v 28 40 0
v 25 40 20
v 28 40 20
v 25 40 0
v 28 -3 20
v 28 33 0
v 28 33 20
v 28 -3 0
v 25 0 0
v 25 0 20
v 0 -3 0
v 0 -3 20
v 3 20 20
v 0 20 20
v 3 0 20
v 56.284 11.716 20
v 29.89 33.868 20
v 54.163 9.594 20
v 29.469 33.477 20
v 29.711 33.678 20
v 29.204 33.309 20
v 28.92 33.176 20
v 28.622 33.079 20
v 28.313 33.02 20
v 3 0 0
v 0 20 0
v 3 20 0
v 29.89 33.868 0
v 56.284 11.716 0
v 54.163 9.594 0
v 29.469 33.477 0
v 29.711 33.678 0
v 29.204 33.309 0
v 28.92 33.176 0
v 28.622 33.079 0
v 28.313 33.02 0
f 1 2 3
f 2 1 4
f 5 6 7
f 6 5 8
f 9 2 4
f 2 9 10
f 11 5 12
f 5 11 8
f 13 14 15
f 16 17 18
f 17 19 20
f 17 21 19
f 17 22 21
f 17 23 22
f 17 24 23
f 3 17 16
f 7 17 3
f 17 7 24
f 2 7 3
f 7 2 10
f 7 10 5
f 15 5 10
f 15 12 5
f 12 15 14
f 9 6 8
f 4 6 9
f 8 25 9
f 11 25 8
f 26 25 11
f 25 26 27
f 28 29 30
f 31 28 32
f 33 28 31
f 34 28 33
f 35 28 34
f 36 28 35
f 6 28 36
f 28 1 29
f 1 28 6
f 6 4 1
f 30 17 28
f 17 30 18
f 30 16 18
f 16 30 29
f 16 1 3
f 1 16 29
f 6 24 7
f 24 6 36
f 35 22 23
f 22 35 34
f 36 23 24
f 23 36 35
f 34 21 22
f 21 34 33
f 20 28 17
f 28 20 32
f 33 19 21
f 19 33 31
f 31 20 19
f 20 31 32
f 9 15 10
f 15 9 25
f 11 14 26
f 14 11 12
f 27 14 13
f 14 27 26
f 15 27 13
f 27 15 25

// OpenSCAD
// preview[view:north east, tilt:top diagonal]

// width of hook
hook_width = 20; //[5:100]

// thickness of part
hook_thick = 3; //[1:10]

// length of top we hang on
hook_top = 22; //[5:100]

// length of overhang latch (twice as long on hanger side)
hook_latch = 20; //[5:100]

// angle of the tongue
hook_angle = 45; //[0:55]

// length of the tongue that sticks out
hook_tongue = 40; //[0:100]

module coathook(hookwidth, hookthick, hooktop, hooklatch, hookangle, hooktongue) {
  rotate ([90,0,0]) union () {
    cube ([hooktop+hookthick, hookwidth, hookthick]);
    rotate ([0,90,0]) cube ([hooklatch, hookwidth, hookthick]);
    rotate ([0,90,0]) {
      translate ([-hookthick, 0, hooktop+hookthick]) {
        union () {
          cube ([(hooklatch*2) + hookthick, hookwidth, hookthick]);
              translate ([(hooklatch*2) + hookthick, 0, hookthick]) 
                rotate ([0,-90-hookangle,0]) 
                  cube ([hooktongue, hookwidth, hookthick]);
              translate ([(hooklatch*2) - hookthick/2, 0, hookthick])
                rotate ([-90,0,0]) 
                  cylinder (
                    h = hookwidth, 
                    r = (hookthick / 2) + 1, 
                    $fn = 50);
        }
      }
    }
  }
}

coathook(hook_width, hook_thick, hook_top, hook_latch, hook_angle, hook_tongue);
